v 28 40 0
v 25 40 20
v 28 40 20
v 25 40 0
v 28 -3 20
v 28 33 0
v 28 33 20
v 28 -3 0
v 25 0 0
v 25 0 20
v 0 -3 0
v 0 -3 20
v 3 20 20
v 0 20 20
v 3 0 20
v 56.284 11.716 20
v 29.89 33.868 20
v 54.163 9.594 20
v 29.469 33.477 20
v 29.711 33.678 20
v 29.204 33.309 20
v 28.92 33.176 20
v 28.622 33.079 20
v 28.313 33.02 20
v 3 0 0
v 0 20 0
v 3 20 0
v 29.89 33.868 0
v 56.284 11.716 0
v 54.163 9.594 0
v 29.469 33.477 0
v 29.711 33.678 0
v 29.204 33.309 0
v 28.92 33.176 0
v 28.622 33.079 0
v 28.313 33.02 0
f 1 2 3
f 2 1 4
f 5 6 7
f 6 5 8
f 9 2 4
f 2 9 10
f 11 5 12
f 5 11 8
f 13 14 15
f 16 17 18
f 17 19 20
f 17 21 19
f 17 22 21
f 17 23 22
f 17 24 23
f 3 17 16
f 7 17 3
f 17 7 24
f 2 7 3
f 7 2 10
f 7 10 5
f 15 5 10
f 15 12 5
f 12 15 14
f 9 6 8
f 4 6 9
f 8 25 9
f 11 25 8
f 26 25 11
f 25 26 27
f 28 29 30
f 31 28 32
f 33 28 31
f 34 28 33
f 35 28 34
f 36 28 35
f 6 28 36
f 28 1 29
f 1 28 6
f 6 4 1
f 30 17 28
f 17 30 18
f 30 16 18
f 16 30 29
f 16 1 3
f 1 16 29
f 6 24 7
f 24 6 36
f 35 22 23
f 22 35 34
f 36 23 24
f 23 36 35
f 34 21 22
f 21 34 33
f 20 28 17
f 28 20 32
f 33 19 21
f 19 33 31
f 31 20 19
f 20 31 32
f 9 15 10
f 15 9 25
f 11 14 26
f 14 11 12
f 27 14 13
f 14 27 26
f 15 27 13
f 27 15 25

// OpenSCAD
// preview[view:north east, tilt:top diagonal]

// width of hook
hook_width = 20; //[5:100]

// thickness of part
hook_thick = 3; //[1:10]

// length of top we hang on
hook_top = 22; //[5:100]

// length of overhang latch (twice as long on hanger side)
hook_latch = 20; //[5:100]

// angle of the tongue
hook_angle = 45; //[0:55]

// length of the tongue that sticks out
hook_tongue = 40; //[0:100]

module coathook(hookwidth, hookthick, hooktop, hooklatch, hookangle, hooktongue) {
  rotate ([90,0,0]) union () {
    cube ([hooktop+hookthick, hookwidth, hookthick]);
    rotate ([0,90,0]) cube ([hooklatch, hookwidth, hookthick]);
    rotate ([0,90,0]) {
      translate ([-hookthick, 0, hooktop+hookthick]) {
        union () {
          cube ([(hooklatch*2) + hookthick, hookwidth, hookthick]);
              translate ([(hooklatch*2) + hookthick, 0, hookthick]) 
                rotate ([0,-90-hookangle,0]) 
                  cube ([hooktongue, hookwidth, hookthick]);
              translate ([(hooklatch*2) - hookthick/2, 0, hookthick])
                rotate ([-90,0,0]) 
                  cylinder (
                    h = hookwidth, 
                    r = (hookthick / 2) + 1, 
                    $fn = 50);
        }
      }
    }
  }
}

coathook(hook_width, hook_thick, hook_top, hook_latch, hook_angle, hook_tongue);
